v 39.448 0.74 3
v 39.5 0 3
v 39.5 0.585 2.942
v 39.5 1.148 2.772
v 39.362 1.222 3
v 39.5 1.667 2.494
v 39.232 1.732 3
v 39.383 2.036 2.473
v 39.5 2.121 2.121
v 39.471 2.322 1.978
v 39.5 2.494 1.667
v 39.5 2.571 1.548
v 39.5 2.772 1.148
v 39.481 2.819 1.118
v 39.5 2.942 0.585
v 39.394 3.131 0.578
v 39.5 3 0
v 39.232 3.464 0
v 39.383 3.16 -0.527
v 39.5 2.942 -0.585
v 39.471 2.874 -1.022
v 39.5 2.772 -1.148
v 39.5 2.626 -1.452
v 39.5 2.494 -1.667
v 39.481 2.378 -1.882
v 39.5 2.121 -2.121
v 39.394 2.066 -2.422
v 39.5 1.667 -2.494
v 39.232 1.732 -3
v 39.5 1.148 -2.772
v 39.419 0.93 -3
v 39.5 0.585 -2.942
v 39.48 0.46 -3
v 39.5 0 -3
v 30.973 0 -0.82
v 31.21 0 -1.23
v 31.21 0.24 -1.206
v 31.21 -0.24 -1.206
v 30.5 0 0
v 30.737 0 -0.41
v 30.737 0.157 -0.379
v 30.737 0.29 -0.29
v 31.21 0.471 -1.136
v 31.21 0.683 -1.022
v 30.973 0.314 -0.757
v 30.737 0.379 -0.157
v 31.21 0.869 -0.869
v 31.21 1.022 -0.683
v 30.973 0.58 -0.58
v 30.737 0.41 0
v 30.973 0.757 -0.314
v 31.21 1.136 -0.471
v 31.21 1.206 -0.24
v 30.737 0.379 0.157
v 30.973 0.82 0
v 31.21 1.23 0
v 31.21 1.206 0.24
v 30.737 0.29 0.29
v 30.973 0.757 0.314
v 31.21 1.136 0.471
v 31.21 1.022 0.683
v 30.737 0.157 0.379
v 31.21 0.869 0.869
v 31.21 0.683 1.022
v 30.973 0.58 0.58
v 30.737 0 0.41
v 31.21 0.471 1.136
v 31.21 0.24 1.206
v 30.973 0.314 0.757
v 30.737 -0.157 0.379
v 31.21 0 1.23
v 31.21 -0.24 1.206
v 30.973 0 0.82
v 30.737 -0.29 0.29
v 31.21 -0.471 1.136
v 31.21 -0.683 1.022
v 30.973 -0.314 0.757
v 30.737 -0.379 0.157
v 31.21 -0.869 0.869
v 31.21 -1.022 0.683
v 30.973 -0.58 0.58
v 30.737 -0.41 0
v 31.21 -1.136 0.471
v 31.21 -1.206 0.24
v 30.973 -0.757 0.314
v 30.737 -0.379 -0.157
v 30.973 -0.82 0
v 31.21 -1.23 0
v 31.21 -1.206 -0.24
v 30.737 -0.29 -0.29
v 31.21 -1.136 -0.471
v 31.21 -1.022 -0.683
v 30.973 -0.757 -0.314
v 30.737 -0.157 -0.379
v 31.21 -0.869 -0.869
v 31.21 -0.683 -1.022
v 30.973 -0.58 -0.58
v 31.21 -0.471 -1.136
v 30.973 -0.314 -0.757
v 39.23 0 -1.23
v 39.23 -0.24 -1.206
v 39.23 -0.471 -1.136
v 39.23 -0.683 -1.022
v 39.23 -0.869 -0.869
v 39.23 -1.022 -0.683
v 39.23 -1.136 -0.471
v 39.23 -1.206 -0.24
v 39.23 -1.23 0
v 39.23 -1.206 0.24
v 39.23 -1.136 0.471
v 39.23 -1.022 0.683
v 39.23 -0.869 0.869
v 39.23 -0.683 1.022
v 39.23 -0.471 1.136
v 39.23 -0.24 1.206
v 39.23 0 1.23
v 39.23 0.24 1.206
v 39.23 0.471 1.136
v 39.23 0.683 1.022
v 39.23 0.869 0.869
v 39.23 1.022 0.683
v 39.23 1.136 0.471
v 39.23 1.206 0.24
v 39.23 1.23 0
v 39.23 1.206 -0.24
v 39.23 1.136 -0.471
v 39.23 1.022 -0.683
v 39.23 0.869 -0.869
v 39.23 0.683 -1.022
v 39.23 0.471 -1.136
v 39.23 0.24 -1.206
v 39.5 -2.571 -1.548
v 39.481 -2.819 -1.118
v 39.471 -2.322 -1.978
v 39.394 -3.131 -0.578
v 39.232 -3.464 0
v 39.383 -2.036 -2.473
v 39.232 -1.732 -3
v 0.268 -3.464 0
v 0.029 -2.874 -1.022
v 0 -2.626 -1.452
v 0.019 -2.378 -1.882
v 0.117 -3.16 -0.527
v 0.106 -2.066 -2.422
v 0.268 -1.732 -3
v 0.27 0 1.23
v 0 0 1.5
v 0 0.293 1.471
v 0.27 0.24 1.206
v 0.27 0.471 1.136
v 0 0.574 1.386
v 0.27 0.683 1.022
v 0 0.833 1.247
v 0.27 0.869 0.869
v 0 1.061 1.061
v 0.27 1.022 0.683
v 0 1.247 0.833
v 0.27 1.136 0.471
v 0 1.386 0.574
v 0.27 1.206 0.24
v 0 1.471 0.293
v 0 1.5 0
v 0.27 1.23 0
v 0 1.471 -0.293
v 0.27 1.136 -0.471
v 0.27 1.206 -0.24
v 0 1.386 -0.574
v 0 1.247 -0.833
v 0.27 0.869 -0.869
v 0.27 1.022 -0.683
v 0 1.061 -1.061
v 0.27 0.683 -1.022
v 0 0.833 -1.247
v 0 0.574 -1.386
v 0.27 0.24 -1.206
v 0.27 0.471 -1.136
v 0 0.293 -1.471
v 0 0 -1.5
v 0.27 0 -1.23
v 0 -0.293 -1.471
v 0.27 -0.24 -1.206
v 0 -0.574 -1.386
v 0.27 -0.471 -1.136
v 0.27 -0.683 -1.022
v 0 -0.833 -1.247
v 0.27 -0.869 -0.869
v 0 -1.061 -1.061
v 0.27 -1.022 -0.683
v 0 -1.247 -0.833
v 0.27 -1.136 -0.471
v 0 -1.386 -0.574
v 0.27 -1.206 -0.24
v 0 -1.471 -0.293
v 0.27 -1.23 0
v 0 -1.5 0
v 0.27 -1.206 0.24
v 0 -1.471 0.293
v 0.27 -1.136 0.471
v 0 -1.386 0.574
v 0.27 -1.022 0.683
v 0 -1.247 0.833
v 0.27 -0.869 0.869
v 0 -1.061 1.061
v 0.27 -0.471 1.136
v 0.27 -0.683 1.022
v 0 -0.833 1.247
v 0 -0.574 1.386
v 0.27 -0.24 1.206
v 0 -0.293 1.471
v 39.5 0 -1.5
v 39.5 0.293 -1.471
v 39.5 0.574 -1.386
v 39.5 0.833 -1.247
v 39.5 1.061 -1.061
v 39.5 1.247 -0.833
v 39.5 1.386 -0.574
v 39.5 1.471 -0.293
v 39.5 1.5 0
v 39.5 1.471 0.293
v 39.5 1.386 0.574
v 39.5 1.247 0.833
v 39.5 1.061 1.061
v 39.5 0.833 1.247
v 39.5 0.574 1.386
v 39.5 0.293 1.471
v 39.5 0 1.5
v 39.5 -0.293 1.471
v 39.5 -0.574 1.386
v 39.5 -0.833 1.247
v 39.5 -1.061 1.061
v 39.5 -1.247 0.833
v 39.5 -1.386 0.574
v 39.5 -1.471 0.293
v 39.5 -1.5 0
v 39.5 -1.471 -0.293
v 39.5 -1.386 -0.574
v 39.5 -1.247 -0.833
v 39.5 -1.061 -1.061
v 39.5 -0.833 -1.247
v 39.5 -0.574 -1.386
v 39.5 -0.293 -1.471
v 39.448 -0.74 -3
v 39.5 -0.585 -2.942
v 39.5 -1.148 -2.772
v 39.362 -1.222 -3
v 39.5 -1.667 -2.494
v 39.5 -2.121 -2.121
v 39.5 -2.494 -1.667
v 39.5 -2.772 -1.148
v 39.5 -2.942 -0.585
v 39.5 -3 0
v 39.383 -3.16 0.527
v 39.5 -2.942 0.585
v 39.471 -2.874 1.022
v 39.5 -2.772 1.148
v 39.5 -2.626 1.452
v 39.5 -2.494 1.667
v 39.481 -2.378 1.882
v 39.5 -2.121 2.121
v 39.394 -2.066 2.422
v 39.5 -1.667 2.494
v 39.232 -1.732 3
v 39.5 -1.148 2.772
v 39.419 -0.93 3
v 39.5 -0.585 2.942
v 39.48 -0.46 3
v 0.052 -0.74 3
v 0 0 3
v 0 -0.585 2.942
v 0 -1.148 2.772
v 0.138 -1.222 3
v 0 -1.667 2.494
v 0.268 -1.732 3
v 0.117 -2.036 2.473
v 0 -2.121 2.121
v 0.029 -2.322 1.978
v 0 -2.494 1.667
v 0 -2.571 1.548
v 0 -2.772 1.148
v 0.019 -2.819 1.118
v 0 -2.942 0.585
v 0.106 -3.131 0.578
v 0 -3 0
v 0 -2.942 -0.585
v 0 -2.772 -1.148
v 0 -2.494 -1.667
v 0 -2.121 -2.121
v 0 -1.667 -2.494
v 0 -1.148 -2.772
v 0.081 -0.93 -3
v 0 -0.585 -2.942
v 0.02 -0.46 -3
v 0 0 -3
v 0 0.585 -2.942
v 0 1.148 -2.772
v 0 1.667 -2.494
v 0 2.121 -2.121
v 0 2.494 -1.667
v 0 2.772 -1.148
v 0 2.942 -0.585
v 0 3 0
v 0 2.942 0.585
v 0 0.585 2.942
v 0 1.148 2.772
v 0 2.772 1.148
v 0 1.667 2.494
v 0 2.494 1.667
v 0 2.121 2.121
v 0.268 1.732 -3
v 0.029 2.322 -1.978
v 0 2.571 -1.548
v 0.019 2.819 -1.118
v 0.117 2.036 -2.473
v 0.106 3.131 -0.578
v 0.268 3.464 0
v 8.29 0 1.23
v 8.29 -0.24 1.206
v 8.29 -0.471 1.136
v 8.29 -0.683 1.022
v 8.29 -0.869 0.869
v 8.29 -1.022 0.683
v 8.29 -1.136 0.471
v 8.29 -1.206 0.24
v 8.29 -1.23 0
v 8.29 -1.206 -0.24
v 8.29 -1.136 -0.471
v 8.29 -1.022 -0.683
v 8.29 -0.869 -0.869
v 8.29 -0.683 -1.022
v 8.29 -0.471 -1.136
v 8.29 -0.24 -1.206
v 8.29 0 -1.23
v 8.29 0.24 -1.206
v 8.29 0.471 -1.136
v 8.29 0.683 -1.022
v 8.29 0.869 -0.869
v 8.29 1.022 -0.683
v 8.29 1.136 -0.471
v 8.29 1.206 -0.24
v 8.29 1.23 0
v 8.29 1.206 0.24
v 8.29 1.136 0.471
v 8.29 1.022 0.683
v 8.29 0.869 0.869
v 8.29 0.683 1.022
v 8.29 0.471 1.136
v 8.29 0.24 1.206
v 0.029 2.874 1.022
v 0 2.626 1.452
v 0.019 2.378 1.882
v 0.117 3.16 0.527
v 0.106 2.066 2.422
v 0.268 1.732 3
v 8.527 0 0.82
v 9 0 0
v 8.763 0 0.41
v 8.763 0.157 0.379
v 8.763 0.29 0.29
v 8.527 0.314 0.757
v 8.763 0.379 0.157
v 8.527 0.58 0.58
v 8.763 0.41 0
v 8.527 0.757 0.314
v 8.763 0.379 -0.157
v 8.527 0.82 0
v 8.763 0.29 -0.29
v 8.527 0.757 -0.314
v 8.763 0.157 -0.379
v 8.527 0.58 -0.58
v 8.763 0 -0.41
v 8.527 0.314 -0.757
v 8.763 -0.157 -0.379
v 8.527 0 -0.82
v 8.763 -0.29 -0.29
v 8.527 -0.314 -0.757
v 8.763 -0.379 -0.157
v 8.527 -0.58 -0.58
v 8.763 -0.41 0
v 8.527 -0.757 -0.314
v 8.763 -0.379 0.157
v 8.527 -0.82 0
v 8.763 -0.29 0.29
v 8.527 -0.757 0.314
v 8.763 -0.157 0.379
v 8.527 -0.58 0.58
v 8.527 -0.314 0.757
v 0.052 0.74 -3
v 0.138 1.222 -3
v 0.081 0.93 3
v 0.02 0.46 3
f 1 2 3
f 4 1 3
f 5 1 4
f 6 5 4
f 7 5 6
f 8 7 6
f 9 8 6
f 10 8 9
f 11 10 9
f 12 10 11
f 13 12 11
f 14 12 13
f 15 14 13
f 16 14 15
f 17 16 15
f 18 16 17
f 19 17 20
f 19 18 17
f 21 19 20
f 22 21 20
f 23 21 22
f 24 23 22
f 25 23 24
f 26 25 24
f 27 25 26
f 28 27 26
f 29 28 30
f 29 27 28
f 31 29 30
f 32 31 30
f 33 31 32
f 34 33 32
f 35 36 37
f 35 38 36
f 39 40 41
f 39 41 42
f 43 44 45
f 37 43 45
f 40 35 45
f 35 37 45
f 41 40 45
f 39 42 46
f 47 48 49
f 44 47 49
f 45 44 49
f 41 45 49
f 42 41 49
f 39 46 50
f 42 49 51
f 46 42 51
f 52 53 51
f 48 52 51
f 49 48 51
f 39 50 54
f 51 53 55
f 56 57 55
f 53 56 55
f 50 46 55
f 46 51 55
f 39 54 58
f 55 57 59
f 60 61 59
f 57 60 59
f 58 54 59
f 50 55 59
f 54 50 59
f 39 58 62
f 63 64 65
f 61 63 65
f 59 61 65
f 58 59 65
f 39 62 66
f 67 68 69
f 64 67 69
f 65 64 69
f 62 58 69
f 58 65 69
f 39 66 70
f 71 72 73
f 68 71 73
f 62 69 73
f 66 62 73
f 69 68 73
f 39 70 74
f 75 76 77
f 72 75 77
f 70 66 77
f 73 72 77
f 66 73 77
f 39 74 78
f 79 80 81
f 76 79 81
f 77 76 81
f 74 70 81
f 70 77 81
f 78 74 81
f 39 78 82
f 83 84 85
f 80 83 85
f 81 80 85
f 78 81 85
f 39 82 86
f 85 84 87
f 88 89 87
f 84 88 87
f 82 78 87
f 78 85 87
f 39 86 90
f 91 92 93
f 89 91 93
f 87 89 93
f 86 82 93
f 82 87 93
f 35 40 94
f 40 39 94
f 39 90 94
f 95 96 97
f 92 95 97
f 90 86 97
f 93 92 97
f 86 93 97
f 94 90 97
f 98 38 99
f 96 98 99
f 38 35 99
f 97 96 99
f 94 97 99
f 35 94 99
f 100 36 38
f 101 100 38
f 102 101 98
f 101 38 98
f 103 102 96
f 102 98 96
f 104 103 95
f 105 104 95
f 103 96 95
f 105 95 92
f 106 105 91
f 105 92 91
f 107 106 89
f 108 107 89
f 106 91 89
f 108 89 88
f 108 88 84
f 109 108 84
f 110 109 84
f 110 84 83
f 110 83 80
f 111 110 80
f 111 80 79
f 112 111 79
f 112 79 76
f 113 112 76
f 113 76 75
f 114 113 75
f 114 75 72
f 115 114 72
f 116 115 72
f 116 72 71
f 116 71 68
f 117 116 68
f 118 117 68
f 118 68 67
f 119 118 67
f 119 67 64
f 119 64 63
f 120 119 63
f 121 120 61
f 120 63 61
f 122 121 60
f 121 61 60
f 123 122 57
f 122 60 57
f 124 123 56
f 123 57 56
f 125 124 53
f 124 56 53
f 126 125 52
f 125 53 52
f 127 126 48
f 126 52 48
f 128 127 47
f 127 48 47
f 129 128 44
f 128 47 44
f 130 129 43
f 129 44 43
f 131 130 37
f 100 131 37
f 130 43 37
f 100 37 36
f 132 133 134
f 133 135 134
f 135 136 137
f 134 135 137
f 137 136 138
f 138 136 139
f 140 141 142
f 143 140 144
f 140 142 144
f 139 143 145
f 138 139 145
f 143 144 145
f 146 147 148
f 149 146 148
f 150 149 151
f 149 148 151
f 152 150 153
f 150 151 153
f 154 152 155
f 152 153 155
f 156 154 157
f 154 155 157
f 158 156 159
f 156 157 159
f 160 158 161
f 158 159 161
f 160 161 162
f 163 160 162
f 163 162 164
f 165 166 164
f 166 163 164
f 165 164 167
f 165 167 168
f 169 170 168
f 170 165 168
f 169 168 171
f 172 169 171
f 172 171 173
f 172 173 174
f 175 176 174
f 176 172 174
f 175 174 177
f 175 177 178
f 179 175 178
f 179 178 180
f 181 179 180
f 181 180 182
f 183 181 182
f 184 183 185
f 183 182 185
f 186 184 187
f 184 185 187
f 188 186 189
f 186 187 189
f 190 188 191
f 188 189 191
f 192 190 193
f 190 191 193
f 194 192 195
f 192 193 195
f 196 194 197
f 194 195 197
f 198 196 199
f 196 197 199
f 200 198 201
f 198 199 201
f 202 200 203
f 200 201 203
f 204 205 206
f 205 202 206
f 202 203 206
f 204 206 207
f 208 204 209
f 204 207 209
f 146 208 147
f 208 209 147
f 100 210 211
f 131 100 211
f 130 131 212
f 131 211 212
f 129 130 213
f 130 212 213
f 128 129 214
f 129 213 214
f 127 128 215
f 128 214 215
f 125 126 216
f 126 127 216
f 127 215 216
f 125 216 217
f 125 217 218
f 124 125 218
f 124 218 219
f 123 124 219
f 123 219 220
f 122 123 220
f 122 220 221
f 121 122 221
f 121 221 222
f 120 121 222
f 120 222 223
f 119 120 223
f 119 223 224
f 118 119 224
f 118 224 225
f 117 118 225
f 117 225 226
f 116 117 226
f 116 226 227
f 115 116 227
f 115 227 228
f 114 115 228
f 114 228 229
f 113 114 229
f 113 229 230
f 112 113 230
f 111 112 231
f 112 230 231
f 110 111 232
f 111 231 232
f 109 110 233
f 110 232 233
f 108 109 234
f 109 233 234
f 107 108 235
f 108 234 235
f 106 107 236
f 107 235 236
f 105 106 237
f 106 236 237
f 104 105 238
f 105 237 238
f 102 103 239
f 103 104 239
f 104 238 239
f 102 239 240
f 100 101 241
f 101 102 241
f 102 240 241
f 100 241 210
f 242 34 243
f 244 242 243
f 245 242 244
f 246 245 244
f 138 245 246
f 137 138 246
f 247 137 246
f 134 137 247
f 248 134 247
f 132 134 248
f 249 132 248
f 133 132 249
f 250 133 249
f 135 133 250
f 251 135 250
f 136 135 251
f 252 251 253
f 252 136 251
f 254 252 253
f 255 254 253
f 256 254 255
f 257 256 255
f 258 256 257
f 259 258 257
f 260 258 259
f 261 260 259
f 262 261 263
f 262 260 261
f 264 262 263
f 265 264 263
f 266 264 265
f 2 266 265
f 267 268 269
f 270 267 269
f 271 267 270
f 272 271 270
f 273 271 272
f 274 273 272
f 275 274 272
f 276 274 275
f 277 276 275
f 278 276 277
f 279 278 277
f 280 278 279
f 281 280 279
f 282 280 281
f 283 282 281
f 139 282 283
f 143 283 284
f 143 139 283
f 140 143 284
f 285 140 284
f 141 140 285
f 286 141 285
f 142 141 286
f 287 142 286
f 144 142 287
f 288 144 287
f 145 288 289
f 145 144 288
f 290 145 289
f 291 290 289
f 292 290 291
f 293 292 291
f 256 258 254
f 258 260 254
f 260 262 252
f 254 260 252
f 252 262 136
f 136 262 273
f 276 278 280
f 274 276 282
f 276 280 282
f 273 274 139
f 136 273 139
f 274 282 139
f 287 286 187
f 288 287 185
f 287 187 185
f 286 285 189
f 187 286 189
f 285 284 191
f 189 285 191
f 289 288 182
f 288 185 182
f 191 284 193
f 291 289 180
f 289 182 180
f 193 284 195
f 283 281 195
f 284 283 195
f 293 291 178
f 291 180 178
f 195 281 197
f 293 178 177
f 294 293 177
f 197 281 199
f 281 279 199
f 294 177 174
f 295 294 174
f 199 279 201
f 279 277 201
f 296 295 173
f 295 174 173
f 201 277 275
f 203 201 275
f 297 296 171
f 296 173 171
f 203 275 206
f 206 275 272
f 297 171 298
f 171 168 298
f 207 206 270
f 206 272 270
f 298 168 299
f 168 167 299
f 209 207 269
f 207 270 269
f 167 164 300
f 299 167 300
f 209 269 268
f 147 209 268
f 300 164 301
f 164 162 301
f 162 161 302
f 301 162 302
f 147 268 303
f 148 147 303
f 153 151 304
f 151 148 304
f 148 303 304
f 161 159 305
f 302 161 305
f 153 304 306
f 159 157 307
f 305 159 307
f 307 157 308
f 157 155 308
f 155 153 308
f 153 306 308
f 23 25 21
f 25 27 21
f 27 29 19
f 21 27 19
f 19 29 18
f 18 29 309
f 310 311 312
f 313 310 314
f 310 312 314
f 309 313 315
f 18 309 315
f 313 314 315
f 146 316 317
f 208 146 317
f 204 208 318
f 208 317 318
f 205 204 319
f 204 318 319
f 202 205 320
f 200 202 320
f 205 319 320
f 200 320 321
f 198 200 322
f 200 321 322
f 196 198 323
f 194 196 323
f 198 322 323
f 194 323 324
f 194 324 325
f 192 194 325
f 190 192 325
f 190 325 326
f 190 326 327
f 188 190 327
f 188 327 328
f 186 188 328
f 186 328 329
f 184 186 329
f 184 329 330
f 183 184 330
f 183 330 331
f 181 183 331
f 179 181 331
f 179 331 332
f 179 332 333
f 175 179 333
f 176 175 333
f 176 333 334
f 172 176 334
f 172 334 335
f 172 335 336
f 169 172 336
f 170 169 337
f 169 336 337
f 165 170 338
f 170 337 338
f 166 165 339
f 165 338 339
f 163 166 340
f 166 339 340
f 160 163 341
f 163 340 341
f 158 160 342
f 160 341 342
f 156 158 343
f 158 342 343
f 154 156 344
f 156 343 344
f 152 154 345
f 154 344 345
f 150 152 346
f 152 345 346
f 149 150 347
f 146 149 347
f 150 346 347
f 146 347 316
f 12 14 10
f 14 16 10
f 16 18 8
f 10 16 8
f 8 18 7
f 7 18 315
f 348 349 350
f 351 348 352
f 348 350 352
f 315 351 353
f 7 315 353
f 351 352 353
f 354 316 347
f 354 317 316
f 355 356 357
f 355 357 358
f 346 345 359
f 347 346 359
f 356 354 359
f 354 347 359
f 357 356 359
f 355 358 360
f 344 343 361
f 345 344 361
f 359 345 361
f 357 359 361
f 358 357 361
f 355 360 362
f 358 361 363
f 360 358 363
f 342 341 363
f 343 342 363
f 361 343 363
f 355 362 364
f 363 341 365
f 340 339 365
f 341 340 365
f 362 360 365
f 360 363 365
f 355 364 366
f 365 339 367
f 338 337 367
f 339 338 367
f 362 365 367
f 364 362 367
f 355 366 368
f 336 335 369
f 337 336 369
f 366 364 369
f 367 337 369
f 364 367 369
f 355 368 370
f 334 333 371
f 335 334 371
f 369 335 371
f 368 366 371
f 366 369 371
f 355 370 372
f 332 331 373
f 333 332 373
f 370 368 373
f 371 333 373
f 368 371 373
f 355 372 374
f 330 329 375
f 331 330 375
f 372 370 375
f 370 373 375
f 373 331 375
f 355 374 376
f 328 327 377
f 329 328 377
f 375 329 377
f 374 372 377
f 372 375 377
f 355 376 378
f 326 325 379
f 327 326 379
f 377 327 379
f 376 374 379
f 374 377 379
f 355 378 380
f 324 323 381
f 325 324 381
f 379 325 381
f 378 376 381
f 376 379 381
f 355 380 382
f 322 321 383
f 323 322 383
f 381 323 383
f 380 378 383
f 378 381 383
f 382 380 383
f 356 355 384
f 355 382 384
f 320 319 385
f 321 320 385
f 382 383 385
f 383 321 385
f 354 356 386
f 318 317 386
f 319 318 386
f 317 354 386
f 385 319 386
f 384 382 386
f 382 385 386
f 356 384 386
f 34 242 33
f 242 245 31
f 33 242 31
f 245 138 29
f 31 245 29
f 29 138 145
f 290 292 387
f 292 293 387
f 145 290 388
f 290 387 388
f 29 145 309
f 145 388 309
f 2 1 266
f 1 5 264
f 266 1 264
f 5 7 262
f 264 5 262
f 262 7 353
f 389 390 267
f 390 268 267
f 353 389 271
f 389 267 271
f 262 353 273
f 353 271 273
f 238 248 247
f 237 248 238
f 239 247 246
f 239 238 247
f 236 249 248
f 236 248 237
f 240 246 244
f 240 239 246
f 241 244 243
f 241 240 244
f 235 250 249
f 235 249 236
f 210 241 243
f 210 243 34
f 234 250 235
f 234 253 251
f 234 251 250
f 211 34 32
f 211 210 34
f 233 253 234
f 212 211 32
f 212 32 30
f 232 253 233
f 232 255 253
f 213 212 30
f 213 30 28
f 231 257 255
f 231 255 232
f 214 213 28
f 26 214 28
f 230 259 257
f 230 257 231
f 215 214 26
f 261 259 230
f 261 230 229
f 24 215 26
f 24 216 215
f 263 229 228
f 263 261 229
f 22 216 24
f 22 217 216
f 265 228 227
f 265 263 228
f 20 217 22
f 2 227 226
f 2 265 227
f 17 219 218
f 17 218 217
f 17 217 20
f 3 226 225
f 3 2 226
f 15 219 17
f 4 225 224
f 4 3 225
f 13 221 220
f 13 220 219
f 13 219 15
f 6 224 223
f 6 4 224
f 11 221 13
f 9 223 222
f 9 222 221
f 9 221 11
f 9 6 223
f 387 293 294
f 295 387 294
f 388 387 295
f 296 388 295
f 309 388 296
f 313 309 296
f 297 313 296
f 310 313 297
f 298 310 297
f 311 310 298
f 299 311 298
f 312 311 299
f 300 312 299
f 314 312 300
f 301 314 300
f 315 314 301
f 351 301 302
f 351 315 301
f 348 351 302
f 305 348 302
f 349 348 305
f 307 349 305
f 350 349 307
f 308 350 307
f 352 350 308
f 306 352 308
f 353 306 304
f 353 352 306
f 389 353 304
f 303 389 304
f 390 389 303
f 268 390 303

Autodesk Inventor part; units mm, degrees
sketch "Sketch_1" plane through (0, 0, 0) normal (0, 0, 1) x (1, 0, 0)
  line L0 (39.5, 0) -> (0, 0)
  line L1 (0, 0) -> (0, 3)
  line L2 (0, 3) -> (0.5485, 3.95)
  line L3 (0.5485, 3.95) -> (38.9515, 3.95)
  line L4 (38.9515, 3.95) -> (39.5, 3)
  line L5 (39.5, 3) -> (39.5, 0)
  line L6 (39.5, 0) -> (0, 0)
revolve "Revolution1" add sketch "Sketch_1" angle 360 about axis through (39.5, 0, 0) along (1, 0, 0)
sketch "Sketch_2" plane through (0, 0, 0) normal (1, 0, 0) x (0, 1, 0)
  line L0 (6, 6) -> (-6, 6)
  line L1 (-6, 6) -> (-6, -6)
  line L2 (-6, -6) -> (6, -6)
  line L3 (6, -6) -> (6, 6)
  line L4 (-1.7321, 3) -> (-3.4641, 0)
  line L5 (-3.4641, 0) -> (-1.7321, -3)
  line L6 (-1.7321, -3) -> (1.7321, -3)
  line L7 (1.7321, -3) -> (3.4641, 0)
  line L8 (3.4641, 0) -> (1.7321, 3)
  line L9 (1.7321, 3) -> (-1.7321, 3)
extrude "Extrusion1" cut sketch "Sketch_2" along normal blind 39.5
sketch "Sketch3" plane through (0, 0, 0) normal (-1, 0, 0) x (0, 0, 1)
  point P0 (0, 0)
hole "Hole1" at (0, 0, 0) direction (1, 0, 0) diameter 2.459 depth 8.2901 tip angle 120 countersink diameter 3 countersink angle 90 thread size "M3x0.5" class "6H" standard "ISO Metric profile"
sketch "Sketch4" plane through (39.5, 0, 0) normal (1, 0, 0) x (0, 0, -1)
  point P0 (0, 0)
hole "Hole2" at (39.5, 0, 0) direction (-1, 0, 0) diameter 2.459 depth 8.2901 tip angle 120 countersink diameter 3 countersink angle 90 thread size "M3x0.5" class "6H" standard "ISO Metric profile"
ref_plane "C3_XY" through (39.5, 0, 0) normal (-1, 0, 0) x (0, 0, -1)
ref_plane "C3_YZ" through (39.5, 0, 0) normal (0, 0, -1) x (0, -1, 0)
ref_plane "C3_ZX" through (39.5, 0, 0) normal (0, -1, 0) x (-1, 0, 0)
properties part number "SLSBF6-39.5-M3-N3"
